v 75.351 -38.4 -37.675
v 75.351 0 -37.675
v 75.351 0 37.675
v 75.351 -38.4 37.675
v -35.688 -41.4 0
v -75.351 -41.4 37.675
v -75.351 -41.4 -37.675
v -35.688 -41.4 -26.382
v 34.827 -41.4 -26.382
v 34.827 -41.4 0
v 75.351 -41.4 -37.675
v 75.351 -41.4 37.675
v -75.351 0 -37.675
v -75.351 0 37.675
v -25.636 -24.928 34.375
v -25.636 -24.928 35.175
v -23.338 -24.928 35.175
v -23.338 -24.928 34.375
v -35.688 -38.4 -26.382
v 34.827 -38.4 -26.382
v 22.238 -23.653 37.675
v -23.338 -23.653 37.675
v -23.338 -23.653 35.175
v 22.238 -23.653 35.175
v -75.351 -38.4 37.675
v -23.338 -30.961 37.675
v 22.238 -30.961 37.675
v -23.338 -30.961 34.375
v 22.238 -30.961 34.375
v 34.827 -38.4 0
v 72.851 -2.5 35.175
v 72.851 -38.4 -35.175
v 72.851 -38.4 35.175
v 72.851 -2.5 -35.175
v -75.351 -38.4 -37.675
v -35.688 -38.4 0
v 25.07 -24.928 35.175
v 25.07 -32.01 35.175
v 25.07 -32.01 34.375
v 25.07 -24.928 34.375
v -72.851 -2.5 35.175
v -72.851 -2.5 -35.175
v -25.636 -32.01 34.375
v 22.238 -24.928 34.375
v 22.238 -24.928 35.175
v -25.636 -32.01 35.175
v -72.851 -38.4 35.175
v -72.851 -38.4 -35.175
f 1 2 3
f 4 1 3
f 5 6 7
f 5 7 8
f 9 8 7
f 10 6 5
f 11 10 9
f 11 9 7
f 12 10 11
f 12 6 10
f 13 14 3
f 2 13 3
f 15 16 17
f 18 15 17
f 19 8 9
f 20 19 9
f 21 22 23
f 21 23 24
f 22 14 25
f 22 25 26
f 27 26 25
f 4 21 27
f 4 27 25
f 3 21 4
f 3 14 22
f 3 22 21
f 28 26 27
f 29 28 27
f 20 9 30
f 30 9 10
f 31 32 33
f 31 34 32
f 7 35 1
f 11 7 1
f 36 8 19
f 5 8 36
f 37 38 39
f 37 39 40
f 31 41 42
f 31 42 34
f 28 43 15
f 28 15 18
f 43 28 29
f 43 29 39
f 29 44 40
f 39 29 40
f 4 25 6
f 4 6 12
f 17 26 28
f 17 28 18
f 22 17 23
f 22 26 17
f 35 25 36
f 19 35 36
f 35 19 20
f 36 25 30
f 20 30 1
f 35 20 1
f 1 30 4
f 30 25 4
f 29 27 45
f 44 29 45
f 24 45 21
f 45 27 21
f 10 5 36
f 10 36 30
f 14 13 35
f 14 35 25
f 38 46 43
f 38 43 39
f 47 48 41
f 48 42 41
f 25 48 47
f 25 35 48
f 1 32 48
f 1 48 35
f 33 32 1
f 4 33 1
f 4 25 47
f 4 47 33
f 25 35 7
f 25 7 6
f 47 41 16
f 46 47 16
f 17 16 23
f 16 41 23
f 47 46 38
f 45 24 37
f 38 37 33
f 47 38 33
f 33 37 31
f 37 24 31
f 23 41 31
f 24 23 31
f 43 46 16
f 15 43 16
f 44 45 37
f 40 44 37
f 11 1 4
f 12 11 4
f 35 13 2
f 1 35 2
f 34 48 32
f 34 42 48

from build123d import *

# Parameters (mm, degrees)
F0_W      = 150.701448
F0_H      = 75.350724
F1_DEPTH  = 38.4
F2_T      = -2.5
F3_W      = 150.701448
F3_H      = 75.350724
F4_DEPTH  = 3
F5_W      = 70.515227
F5_H      = 26.381703
F6_DEPTH  = 12
F7_W      = 50.705938
F7_H      = 7.081837
F8_DEPTH  = 3.3
F9_W      = 45.575881
F9_H      = 7.308297
F10_DEPTH = 30.7


with BuildPart() as f1:
    # F0 (on Front) → F1 (new body)
    with BuildSketch(Plane.XZ):
        Rectangle(F0_W, F0_H)
    extrude(amount=F1_DEPTH)

    # F2
    f2_openings = [f1.faces().sort_by_distance(p)[0] for p in [
        (0, -38.4, 0),
    ]]
    offset(amount=F2_T, openings=f2_openings)

    # F7 (on face) → F8 (join)
    with BuildSketch(Plane.XY.offset(37.675362)):
        with Locations((-0.283274, -28.468977)):
            Rectangle(F7_W, F7_H)
    extrude(amount=-F8_DEPTH)

    # F9 (on face) → F10 (cut)
    with BuildSketch(Plane.XY.offset(37.675362)):
        with Locations((-0.549773, -27.306931)):
            Rectangle(F9_W, F9_H)
    extrude(amount=-F10_DEPTH, mode=Mode.SUBTRACT)


with BuildPart() as f4:
    # F3 (on face) → F4 (new body)
    with BuildSketch(Plane.XZ.offset(38.4)):
        Rectangle(F3_W, F3_H)
    extrude(amount=F4_DEPTH)

    # F5 (on face) → F6 (cut)
    with BuildSketch(Plane.XZ.offset(41.4)):
        with Locations((-0.430302, -13.190851)):
            Rectangle(F5_W, F5_H)
    extrude(amount=-F6_DEPTH, mode=Mode.SUBTRACT)


solid = Compound([f1.part, f4.part])
